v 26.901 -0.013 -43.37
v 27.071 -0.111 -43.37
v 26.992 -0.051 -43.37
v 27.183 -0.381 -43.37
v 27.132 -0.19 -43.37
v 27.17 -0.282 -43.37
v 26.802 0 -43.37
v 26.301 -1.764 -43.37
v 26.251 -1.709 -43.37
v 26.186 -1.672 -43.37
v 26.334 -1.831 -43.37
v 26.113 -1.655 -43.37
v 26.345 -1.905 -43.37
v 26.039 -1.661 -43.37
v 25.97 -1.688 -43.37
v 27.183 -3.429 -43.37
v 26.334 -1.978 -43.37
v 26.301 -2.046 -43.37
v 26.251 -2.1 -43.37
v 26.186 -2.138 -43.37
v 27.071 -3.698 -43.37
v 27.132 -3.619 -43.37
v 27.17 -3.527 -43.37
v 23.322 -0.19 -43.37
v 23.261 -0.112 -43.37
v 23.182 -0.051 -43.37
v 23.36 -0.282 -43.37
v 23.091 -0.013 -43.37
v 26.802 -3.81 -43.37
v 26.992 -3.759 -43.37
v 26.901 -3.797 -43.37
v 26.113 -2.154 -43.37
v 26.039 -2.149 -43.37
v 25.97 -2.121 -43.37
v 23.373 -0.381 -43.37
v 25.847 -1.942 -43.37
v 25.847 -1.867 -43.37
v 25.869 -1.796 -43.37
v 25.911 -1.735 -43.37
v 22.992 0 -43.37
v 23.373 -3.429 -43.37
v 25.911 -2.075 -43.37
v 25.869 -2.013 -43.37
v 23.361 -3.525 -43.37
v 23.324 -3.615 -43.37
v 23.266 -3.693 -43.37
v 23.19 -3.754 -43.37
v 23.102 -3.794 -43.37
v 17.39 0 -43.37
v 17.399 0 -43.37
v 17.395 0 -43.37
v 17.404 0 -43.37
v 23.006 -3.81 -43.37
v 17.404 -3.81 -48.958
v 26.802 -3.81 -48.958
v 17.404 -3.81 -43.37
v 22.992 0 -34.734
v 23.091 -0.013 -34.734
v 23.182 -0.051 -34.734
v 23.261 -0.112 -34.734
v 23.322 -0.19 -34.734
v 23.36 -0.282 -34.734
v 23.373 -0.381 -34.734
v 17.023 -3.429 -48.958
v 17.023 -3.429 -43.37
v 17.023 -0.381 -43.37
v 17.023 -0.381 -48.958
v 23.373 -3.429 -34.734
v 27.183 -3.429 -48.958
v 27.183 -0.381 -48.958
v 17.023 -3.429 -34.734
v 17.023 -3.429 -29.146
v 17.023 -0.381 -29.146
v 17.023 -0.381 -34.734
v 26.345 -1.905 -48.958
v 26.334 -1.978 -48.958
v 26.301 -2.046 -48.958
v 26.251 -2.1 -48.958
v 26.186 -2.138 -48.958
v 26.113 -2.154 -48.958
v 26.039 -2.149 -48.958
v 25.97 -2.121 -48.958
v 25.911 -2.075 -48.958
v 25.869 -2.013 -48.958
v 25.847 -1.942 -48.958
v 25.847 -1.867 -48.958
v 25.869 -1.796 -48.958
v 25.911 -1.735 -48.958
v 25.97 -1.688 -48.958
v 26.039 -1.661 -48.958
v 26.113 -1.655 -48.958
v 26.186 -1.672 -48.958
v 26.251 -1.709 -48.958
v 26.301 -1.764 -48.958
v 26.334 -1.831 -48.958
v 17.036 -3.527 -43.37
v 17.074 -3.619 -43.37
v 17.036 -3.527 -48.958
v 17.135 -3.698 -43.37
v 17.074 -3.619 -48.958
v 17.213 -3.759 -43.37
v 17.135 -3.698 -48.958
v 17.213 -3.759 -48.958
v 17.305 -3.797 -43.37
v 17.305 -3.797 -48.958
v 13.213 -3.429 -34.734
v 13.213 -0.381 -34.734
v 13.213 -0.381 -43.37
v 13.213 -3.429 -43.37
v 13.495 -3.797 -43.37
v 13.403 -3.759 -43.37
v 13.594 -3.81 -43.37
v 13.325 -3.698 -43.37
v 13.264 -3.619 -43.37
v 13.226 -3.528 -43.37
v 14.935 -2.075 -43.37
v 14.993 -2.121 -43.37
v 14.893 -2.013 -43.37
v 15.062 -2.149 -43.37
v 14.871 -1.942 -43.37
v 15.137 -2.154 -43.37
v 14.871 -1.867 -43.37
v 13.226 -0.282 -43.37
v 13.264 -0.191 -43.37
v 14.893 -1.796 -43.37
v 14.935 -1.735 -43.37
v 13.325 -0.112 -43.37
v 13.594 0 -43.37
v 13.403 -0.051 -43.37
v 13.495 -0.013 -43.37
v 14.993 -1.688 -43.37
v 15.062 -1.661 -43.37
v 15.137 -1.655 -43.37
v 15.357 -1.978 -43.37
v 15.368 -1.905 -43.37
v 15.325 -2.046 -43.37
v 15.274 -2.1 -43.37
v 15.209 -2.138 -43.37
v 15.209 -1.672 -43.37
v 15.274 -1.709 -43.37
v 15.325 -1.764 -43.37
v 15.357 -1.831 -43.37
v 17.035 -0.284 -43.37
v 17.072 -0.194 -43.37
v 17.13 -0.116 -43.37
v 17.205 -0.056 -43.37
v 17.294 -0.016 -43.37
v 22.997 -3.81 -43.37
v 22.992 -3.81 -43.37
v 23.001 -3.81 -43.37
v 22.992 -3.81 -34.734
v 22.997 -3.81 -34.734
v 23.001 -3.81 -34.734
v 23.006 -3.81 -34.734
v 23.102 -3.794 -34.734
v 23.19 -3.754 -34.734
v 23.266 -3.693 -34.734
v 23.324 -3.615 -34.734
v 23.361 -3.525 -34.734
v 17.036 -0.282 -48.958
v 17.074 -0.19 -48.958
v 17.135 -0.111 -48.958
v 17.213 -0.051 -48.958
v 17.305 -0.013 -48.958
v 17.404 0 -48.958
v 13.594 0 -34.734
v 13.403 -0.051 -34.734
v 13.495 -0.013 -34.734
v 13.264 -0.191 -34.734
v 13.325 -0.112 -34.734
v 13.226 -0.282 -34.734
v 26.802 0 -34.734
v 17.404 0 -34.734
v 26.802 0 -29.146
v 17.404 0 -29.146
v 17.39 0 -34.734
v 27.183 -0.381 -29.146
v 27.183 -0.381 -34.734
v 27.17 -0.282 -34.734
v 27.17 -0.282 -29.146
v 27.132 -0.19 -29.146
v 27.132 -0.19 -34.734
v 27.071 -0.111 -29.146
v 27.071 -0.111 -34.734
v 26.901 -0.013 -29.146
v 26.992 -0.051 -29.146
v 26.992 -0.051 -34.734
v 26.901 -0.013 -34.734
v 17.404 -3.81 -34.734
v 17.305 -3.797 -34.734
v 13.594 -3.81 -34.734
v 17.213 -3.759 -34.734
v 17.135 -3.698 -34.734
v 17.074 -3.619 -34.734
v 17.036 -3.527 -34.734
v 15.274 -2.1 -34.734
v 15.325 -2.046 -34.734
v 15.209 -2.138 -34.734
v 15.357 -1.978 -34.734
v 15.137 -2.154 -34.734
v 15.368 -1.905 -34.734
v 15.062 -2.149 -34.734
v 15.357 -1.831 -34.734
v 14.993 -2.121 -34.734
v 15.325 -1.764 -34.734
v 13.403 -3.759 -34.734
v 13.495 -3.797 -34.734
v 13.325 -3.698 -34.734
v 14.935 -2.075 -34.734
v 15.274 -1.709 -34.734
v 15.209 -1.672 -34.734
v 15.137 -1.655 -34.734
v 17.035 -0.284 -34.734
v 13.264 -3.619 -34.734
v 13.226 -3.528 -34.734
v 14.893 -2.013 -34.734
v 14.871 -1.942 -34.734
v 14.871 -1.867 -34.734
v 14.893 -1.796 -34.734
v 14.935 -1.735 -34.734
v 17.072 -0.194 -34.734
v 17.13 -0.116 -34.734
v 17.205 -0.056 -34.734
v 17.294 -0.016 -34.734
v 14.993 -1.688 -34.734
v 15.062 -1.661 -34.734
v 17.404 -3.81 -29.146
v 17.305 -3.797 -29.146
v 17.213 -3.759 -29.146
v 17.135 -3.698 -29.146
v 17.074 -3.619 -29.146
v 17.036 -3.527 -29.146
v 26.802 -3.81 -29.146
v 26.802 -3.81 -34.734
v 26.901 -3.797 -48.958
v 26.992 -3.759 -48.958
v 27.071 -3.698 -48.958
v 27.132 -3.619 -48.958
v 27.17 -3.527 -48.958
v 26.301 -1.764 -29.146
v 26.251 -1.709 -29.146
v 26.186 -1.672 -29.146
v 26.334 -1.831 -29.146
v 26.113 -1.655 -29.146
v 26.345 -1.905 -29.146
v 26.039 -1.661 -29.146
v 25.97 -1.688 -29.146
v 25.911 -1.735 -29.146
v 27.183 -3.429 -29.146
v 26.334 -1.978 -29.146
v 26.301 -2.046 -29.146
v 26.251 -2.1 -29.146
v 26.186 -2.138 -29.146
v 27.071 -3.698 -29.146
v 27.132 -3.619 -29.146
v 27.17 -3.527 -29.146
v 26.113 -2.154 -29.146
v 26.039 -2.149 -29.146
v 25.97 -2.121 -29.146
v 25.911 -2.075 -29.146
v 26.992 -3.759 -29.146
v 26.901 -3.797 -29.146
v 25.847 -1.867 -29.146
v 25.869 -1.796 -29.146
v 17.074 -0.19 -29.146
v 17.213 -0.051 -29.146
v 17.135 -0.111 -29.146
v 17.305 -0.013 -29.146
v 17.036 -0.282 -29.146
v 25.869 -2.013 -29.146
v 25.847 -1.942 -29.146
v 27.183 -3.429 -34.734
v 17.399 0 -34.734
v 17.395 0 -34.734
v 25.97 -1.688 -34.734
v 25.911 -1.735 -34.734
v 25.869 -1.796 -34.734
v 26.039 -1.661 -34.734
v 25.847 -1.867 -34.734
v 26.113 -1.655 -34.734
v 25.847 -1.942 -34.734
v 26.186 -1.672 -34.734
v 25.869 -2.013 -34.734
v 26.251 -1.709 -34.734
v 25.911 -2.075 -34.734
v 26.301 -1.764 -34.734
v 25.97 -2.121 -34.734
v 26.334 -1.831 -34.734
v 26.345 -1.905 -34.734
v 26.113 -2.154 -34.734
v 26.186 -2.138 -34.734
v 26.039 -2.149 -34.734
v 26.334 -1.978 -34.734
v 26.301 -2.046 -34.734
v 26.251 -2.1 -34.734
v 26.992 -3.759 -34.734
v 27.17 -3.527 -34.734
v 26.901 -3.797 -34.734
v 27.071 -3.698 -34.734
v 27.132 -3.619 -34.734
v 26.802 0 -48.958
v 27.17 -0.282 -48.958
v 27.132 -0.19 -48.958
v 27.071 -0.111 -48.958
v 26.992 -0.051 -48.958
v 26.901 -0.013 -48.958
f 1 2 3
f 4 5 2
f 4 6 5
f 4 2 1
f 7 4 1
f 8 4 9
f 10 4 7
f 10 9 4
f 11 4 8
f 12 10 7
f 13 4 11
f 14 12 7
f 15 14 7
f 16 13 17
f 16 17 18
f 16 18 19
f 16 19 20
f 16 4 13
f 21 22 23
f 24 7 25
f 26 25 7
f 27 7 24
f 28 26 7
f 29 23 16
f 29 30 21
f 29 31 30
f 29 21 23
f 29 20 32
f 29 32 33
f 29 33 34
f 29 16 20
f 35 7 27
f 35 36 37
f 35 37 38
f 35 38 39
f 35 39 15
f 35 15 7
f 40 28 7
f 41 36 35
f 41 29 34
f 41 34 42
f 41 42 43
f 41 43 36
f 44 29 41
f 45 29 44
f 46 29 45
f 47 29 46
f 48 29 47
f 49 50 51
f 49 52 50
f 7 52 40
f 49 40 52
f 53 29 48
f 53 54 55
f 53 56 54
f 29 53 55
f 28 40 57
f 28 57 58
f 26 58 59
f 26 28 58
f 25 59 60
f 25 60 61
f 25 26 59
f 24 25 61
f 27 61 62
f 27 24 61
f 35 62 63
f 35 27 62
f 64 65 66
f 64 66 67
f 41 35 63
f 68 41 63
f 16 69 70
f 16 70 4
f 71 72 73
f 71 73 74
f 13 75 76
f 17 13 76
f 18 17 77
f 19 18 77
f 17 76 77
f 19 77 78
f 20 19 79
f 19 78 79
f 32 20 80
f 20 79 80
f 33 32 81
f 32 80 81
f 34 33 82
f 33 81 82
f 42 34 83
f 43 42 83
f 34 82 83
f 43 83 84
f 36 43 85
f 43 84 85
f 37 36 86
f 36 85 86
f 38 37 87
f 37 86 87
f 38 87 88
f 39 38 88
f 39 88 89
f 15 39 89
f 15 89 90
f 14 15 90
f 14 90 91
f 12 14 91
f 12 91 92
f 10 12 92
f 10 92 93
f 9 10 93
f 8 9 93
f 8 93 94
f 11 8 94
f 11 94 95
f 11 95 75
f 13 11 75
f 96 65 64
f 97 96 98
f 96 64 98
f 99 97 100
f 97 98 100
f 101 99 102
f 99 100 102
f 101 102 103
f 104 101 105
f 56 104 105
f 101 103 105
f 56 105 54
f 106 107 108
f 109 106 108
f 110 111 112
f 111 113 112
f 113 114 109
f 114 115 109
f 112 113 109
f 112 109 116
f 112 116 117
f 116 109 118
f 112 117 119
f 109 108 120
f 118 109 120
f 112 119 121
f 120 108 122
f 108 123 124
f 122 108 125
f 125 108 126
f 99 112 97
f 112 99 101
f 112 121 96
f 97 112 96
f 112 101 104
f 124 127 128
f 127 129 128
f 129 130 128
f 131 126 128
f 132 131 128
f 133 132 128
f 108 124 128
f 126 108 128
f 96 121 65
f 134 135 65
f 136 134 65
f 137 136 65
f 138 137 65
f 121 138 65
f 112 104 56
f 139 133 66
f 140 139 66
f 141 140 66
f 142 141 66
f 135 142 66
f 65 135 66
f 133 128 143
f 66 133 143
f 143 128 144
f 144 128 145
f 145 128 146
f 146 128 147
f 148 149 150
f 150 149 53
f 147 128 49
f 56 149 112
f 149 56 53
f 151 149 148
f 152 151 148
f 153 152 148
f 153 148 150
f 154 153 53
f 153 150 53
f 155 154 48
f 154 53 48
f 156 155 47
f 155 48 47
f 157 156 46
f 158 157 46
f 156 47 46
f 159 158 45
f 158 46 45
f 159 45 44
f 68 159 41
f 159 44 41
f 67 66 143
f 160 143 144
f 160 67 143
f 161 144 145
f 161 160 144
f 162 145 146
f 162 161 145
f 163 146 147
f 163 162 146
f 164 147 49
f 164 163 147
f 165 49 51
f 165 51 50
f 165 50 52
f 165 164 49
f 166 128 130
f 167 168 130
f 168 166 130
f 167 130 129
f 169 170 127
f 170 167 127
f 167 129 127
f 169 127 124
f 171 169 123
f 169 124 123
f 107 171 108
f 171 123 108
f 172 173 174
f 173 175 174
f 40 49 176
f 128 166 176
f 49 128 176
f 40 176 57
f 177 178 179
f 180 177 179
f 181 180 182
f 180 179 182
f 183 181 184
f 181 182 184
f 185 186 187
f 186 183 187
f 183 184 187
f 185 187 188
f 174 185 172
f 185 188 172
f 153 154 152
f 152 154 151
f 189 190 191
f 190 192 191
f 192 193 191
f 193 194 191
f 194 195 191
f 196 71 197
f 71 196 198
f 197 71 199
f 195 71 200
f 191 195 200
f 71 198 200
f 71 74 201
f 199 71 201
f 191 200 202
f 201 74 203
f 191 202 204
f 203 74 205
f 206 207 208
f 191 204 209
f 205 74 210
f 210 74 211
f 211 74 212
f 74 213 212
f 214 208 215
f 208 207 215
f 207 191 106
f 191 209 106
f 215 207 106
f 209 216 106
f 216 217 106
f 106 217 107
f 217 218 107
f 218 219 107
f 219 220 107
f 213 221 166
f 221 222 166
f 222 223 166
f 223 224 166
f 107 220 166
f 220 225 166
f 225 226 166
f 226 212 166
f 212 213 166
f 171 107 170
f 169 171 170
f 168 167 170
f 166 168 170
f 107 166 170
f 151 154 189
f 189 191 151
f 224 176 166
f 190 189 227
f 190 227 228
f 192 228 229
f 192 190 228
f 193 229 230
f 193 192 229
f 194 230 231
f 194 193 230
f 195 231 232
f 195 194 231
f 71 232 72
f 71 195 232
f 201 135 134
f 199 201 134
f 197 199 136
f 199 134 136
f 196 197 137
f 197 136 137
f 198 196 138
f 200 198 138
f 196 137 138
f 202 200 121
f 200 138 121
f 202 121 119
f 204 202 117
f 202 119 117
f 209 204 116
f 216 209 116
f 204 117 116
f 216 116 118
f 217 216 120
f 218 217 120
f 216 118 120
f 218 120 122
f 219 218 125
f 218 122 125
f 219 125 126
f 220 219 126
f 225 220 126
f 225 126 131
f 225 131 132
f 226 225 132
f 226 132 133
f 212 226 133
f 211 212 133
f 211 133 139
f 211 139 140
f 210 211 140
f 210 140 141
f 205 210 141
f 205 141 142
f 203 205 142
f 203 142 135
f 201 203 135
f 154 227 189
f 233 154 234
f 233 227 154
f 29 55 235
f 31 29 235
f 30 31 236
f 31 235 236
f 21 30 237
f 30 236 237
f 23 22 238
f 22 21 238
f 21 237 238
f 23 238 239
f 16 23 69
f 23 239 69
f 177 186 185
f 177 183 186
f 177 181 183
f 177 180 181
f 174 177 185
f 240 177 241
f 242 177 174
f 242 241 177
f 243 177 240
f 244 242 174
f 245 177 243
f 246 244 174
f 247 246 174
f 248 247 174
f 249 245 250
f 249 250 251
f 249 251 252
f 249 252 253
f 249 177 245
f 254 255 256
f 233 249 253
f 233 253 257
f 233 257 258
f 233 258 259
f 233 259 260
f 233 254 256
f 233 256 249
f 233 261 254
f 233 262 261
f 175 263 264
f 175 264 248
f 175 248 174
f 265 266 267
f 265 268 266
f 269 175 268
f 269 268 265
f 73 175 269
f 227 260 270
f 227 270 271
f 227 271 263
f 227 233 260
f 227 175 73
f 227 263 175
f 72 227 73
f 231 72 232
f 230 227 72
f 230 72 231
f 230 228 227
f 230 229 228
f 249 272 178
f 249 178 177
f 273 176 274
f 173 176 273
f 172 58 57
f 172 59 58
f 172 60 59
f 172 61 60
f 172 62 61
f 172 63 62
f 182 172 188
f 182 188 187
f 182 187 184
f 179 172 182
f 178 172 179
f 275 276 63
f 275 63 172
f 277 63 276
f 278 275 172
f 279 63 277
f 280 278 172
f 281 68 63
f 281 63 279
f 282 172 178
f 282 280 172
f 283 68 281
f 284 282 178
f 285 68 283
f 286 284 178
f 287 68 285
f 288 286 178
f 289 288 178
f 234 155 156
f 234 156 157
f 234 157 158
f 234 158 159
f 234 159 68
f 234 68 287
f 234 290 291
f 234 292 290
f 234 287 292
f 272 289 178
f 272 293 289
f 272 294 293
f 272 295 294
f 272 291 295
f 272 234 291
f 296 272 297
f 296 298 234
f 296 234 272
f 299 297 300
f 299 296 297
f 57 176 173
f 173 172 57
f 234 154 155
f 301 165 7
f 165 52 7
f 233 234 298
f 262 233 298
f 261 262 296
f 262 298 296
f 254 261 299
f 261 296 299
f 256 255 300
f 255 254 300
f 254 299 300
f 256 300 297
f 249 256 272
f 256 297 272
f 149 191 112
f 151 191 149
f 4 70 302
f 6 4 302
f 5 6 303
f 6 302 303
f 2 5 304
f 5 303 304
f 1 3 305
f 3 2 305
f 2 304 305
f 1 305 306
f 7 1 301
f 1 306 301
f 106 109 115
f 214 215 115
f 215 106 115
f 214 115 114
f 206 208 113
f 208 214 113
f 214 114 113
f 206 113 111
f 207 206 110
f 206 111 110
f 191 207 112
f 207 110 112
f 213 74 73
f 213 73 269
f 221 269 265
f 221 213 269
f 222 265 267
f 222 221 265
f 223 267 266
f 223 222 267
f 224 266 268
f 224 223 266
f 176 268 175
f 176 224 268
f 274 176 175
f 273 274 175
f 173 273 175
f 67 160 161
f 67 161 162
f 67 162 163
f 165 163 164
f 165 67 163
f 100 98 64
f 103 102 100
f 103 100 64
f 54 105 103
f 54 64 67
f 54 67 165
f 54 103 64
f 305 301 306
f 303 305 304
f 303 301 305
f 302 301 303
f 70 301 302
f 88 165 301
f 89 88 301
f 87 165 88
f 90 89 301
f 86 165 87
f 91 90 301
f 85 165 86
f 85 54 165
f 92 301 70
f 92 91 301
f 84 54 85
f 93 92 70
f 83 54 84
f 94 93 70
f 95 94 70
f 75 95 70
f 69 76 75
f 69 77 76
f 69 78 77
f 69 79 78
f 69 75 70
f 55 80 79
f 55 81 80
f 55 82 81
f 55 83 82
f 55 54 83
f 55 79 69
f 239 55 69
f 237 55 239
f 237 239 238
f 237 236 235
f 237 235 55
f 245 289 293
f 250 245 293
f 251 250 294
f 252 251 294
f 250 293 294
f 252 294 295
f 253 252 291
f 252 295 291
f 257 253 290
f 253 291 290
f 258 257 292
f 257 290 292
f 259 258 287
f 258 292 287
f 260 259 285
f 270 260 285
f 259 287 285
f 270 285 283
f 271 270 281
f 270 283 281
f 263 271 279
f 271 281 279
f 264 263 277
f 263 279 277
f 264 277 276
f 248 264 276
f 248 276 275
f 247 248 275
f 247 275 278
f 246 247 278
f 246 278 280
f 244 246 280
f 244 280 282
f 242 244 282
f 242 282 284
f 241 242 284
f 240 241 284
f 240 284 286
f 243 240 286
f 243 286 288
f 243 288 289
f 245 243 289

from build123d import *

# Parameters (mm, degrees)
F1_DEPTH     = 3.81
F3_START     = -0.000254
F3_DEPTH     = 3.81
F4_R         = 0.2501042953
F5_DEPTH     = 50.8
F6_T1_DEPTH  = 7.493
F6_T3_DEPTH  = 6.5405
F6_T5_DEPTH  = 7.493
F6_T7_DEPTH  = 6.5405
F6_T9_DEPTH  = 8.636
F6_T11_DEPTH = 10.541
F7_R         = 0.2501042953
F8_DEPTH     = 50.8


# Not quite as in the source:
# - a fillet or chamfer that OpenCascade refuses, or shapes differently, is made with other operations: its cross-section is extruded or revolved along the edge and cut away or added


with BuildPart() as f1:
    # F0 (on Front) → F1 (new body)
    with BuildSketch(Plane.XZ):
        Polygon((23.3729397243, -34.7344989846), (17.0229397243, -34.7344989846), (13.2129397243, -34.7344989846), (13.2129397243, -43.3704989846), (17.0229397243, -43.3704989846), (23.3729397243, -43.3704989846), align=None)
    extrude(amount=F1_DEPTH)

    # F2 (on face) → F3 (join)
    with BuildSketch(Plane.XZ.offset(3.81).offset(F3_START)):
        Polygon((27.1829397243, -29.1464989846), (17.0229397243, -29.1464989846), (17.0229397243, -34.7344989846), (23.3729397243, -34.7344989846), (27.1829397243, -34.7344989846), align=None)
        Polygon((27.1829397243, -43.3704989846), (23.3729397243, -43.3704989846), (17.0229397243, -43.3704989846), (17.0229397243, -48.9584989846), (27.1829397243, -48.9584989846), align=None)
    extrude(amount=-F3_DEPTH)

    # F4 (on face) → F5 (cut)
    with BuildSketch(Plane(origin=(0, 0, -48.9584989846), x_dir=(1, 0, 0), z_dir=(0, 0, -1))):
        with Locations((26.094635429, 1.904746)):
            Circle(F4_R)
    extrude(amount=-F5_DEPTH, mode=Mode.SUBTRACT)

    # F6: fillet of radius 0.381 on 12 edges, made by hand

    # F6_s2 → F6_t1 (cut)
    with BuildSketch(Plane.XY.offset(-35.6869989846)):
        with BuildLine():
            ThreePointArc((26.8019397243, -3.809746), (27.071347408, -3.6981536836), (27.1829397243, -3.428746))
            Line((27.1829397243, -3.428746), (27.1829397243, -3.809746))
            Line((27.1829397243, -3.809746), (26.8019397243, -3.809746))
        make_face()
        with BuildLine():
            ThreePointArc((27.1829397243, -0.380746), (27.071347408, -0.1113383164), (26.8019397243, 0.000254))
            Line((26.8019397243, 0.000254), (27.1829397243, 0.000254))
            Line((27.1829397243, 0.000254), (27.1829397243, -0.380746))
        make_face()
    extrude(amount=F6_T1_DEPTH, mode=Mode.SUBTRACT)

    # F6_s4 → F6_t3 (cut)
    with BuildSketch(Plane.XY.offset(-34.7344989846)):
        with BuildLine():
            ThreePointArc((17.4039397243, -3.809746), (17.1345320407, -3.6981536836), (17.0229397243, -3.428746))
            Line((17.0229397243, -3.428746), (17.0229397243, -3.809746))
            Line((17.0229397243, -3.809746), (17.4039397243, -3.809746))
        make_face()
        with BuildLine():
            ThreePointArc((17.0229397243, -0.380746), (17.1345320407, -0.1113383164), (17.4039397243, 0.000254))
            Line((17.4039397243, 0.000254), (17.0229397243, 0.000254))
            Line((17.0229397243, 0.000254), (17.0229397243, -0.380746))
        make_face()
    extrude(amount=F6_T3_DEPTH, mode=Mode.SUBTRACT)

    # F6_s6 → F6_t5 (cut)
    with BuildSketch(Plane.XY.offset(-49.9109989846)):
        with BuildLine():
            ThreePointArc((26.8019397243, -3.809746), (27.071347408, -3.6981536836), (27.1829397243, -3.428746))
            Line((27.1829397243, -3.428746), (27.1829397243, -3.809746))
            Line((27.1829397243, -3.809746), (26.8019397243, -3.809746))
        make_face()
        with BuildLine():
            ThreePointArc((27.1829397243, -0.380746), (27.071347408, -0.1113383164), (26.8019397243, 0.000254))
            Line((26.8019397243, 0.000254), (27.1829397243, 0.000254))
            Line((27.1829397243, 0.000254), (27.1829397243, -0.380746))
        make_face()
    extrude(amount=F6_T5_DEPTH, mode=Mode.SUBTRACT)

    # F6_s8 → F6_t7 (cut)
    with BuildSketch(Plane.XY.offset(-49.9109989846)):
        with BuildLine():
            ThreePointArc((17.0229397243, -3.428746), (17.1345320407, -3.6981536836), (17.4039397243, -3.809746))
            Line((17.4039397243, -3.809746), (17.0229397243, -3.809746))
            Line((17.0229397243, -3.809746), (17.0229397243, -3.428746))
        make_face()
        with BuildLine():
            ThreePointArc((17.0229397243, -0.380746), (17.1345320407, -0.1113383164), (17.4039397243, 0.000254))
            Line((17.4039397243, 0.000254), (17.0229397243, 0.000254))
            Line((17.0229397243, 0.000254), (17.0229397243, -0.380746))
        make_face()
    extrude(amount=F6_T7_DEPTH, mode=Mode.SUBTRACT)

    # F6_s10 → F6_t9 (cut)
    with BuildSketch(Plane.XY.offset(-43.3704989846)):
        with BuildLine():
            ThreePointArc((22.9919397243, -3.81), (23.261347408, -3.6984076836), (23.3729397243, -3.429))
            Line((23.3729397243, -3.429), (23.3729397243, -3.81))
            Line((23.3729397243, -3.81), (22.9919397243, -3.81))
        make_face()
        with BuildLine():
            ThreePointArc((22.9919397243, 0), (23.261347408, -0.1115923164), (23.3729397243, -0.381))
            Line((23.3729397243, -0.381), (23.3729397243, 0))
            Line((23.3729397243, 0), (22.9919397243, 0))
        make_face()
    extrude(amount=F6_T9_DEPTH, mode=Mode.SUBTRACT)

    # F6_s12 → F6_t11 (cut)
    with BuildSketch(Plane.XY.offset(-44.3229989846)):
        with BuildLine():
            ThreePointArc((13.2129397243, -3.429), (13.3245320407, -3.6984076836), (13.5939397243, -3.81))
            Line((13.5939397243, -3.81), (13.2129397243, -3.81))
            Line((13.2129397243, -3.81), (13.2129397243, -3.429))
        make_face()
        with BuildLine():
            ThreePointArc((13.5939397243, 0), (13.3245320407, -0.1115923164), (13.2129397243, -0.381))
            Line((13.2129397243, -0.381), (13.2129397243, 0))
            Line((13.2129397243, 0), (13.5939397243, 0))
        make_face()
    extrude(amount=F6_T11_DEPTH, mode=Mode.SUBTRACT)

    # F7 (on face) → F8 (cut)
    with BuildSketch(Plane(origin=(0, 0, -43.3704989846), x_dir=(1, 0, 0), z_dir=(0, 0, -1))):
        with Locations((15.1179397243, 1.904746)):
            Circle(F7_R)
    extrude(amount=-F8_DEPTH, mode=Mode.SUBTRACT)


solid = f1.part
